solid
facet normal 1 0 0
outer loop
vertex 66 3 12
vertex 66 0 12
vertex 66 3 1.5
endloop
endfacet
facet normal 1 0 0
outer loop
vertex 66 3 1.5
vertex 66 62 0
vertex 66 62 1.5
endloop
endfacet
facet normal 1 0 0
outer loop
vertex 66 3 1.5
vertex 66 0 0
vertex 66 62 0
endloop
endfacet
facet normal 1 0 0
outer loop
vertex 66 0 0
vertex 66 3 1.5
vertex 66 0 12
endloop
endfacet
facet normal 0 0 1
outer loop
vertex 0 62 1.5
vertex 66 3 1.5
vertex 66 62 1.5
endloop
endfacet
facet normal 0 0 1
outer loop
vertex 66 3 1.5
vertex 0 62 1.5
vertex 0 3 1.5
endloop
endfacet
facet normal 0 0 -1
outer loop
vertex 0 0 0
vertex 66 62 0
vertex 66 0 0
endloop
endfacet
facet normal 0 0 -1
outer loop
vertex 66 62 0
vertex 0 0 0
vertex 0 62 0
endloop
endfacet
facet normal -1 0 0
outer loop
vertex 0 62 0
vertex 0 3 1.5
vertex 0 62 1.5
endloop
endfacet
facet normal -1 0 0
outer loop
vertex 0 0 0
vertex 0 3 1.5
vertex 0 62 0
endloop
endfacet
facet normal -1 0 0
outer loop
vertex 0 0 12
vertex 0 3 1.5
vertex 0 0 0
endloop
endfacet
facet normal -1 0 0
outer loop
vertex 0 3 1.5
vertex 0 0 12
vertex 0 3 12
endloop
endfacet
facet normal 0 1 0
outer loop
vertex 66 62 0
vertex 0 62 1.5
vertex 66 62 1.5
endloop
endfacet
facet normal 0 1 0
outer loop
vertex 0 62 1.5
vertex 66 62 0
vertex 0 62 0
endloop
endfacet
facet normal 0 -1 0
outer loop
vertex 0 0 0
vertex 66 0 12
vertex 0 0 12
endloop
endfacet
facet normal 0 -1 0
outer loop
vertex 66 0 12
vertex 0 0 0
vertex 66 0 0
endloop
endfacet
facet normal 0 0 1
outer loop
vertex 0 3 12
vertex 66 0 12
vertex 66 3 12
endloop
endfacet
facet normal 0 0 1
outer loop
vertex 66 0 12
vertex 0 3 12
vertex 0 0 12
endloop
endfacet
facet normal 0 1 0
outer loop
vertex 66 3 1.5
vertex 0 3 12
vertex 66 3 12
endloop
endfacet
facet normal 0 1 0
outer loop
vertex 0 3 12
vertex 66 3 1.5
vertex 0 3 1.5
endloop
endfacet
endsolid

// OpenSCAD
$w=65; //width in mm
$h=46; // height in mm
$d=52; // depth in mm
$l=3; // thickness
$sw=20; //screen window width
$sh=20; //screen window height
$bw=8; // button window width
$bh=8; // button window height
union()
{
    cube([66,59+$l,1.5]);
    cube([66,$l,4*$l]);
}
/*
difference()
{
    union()
    {
        union()
        {
            difference()
            {
                cube([$w+2*$l,$l,$h+2*$l]);
                translate([$l+20,2*$l,15+$l])
                {
                    rotate([90,0,0])
                    {
                        cylinder(4*$l,r=10);
                    }
                }
                translate([$l+20+25,2*$l,15+$l])
                {
                    rotate([90,0,0])
                    {
                        cylinder(4*$l,r=10);
                    }
                }
            }
            
            
            color([0,0,0,1])
            {
                translate([4*$l, $l,29])
                {
                    rotate([90,0,0])
                    {
                        linear_extrude(height=2*$l)
                        {
                            text("RBA", size=15,font=str("Arial Black",":style=Bold"));
                        }
                    }
                }
            }
        }
        difference()
        {
            cube([$l,$d+2*$l,$h+2*$l]);
        }
        difference()
        {
            translate([$w+$l,0,0])
            {
                cube([$l,$d+2*$l,$h+2*$l]);
            }
        }
        difference()
        {
            translate([0,$d+2*$l,0])
            {
                cube([$w+2*$l,$l,$h+2*$l]);
            }
        }
        difference()
        {
            translate([0,0,$h+$l])
            {
                cube([$w+2*$l,$d+2*$l,$l]);
            }
            translate([($w-$sw)/2+$l,($d-$sh)/2+$l,$h-$l])
            {
                cube($sw,$sh,3*$l);
            }
            translate([$l+3,($d-$bh)/2+$l,$h-$l])
            {
                cube([$bw,$bh,3*$l]);
            }
            translate([$w-3*$l,($d-$bh)/2+$l,$h-$l])
            {
                cube([$bw,$bh,3*$l]);
            }
        }
        difference()
        {
            translate([-15-$l-1,0,0])
            {
                cube([15+$l+1,$d+3*$l,2*$l]);
            }
            translate([-8,10,0])
            {
                cube([5+$l,$d-4*$l,2*$l]);
            }
        }
        difference()
        {
            translate([$w+2*$l,0,0])
            {
                cube([15+$l+1,$d+3*$l,2*$l]);
            }
            translate([$w+5*$l-9,10,0])
            {
                cube([5+$l,$d-4*$l,2*$l]);
            }
        }
        */
        /*
        difference()
        {
            translate([$w+2*$l,$d+$l,0])
            {
                cube([15+$l+1,2*$l,$h+2*$l]);
            }
            translate([$w+2*$l,$d+$l,0])
            {
                cube([5+$l+5,2*$l,$h-2*$l]);e
            }
        }
        */
        /*
        union()
        {
            translate([$w+16,$d+$l,0])
            {
                cube([5+$l+1,2*$l,$h+2*$l]);
            }
            translate([$w,$d+$l,$h-$l])
            {
                cube([15+$l+1,2*$l,3*$l]);
            }
        }
        union()
        {
            translate([-15-$l-1,$d+$l,0])
            {
                cube([5+$l+1,2*$l,$h+2*$l]);
            }
            translate([-8-$l,$d+$l,$h-$l])
            {
                cube([15+$l+1,2*$l,3*$l]);
            }
        }
    }

    translate([$l-1,$l-1,$l-1])
    {
        cube([$w+2,$d+3*$l,$l-1]);
    }
    translate([$w-10+$l,0,40])
    {
        cube([15,15,8]);
    }

}
*/
